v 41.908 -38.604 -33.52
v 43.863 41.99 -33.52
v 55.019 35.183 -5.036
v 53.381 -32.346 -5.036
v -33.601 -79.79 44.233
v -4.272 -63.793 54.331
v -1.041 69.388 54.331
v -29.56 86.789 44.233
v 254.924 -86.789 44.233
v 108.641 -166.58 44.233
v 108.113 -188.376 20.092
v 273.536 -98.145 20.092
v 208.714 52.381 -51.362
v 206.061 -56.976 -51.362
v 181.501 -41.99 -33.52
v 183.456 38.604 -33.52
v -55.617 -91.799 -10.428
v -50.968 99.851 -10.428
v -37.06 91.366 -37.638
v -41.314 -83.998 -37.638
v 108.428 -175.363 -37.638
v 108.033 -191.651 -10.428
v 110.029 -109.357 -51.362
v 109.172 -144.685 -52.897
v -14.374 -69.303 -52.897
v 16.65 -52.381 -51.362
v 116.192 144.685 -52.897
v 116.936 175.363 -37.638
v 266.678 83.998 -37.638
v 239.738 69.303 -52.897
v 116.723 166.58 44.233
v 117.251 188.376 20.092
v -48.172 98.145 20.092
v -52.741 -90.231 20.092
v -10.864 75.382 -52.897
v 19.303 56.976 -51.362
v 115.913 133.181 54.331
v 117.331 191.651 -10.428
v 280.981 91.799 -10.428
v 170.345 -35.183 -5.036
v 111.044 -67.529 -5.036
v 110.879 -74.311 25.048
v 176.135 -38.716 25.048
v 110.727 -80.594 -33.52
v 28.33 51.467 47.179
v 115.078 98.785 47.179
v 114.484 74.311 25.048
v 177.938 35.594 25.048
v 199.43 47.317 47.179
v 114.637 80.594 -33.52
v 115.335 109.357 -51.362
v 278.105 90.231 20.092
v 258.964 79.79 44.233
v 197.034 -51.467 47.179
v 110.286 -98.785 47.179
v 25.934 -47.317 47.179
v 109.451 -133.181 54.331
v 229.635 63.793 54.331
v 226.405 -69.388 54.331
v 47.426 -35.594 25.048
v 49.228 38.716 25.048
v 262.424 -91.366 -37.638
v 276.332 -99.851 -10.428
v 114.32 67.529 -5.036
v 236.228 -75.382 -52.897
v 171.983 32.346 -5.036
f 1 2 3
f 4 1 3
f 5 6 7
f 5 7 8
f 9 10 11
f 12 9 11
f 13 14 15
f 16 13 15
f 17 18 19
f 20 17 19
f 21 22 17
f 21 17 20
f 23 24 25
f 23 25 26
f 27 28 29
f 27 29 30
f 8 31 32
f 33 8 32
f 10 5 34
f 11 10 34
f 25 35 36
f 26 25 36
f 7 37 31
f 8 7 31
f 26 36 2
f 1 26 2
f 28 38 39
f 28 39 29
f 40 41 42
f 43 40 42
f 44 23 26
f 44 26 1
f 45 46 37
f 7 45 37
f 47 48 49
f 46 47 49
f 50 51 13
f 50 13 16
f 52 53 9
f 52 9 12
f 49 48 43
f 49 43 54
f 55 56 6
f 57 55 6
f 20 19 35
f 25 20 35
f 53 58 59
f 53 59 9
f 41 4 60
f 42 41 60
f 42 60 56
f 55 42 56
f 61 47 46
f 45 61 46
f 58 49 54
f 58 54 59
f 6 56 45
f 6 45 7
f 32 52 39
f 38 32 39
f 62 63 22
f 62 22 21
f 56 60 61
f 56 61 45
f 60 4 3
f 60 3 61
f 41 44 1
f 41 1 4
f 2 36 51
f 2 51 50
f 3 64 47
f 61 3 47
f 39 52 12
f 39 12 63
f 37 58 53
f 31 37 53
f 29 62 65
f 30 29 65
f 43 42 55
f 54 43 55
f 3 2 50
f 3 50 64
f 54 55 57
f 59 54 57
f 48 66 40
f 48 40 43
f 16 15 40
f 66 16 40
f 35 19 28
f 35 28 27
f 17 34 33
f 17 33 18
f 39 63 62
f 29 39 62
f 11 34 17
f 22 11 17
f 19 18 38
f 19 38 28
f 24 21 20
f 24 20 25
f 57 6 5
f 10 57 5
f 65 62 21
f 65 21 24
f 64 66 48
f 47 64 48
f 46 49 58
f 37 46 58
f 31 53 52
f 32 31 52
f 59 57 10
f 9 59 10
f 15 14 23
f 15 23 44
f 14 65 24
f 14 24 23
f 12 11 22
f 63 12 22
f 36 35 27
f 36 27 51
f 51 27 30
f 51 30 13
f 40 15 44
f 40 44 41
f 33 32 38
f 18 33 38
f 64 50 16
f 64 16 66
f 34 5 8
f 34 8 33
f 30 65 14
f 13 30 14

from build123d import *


with BuildPart() as f2:
    # F2: sweep along a path in F1
    with BuildLine(Plane.XY) as f2_path:
        Line((111.1026118188, -65.109723053), (55.505612987, -31.187103672))
        Line((55.505612987, -31.187103672), (57.0849637179, 33.922619381))
        Line((57.0849637179, 33.922619381), (114.2613132806, 65.109723053))
        Line((114.2613132806, 65.109723053), (169.8583121124, 31.187103672))
        Line((169.8583121124, 31.187103672), (168.2789613815, -33.922619381))
        Line((168.2789613815, -33.922619381), (111.1026118188, -65.109723053))
    # F0 (on Front) → F2 (sweep)
    with BuildSketch(Plane.XZ):
        Polygon((-12.6929697398, -52.8973966771), (17.9204861451, -51.3624593682), (42.8443142989, -33.5203041197), (54.1653753864, -5.0356891564), (48.2893125029, 25.0477215336), (27.0817340957, 47.1786576154), (-2.7241035365, 54.3307032528), (-31.6650575434, 44.2331344899), (-50.5525795149, 20.0918580627), (-53.3900146779, -10.428441337), (-39.2764974165, -37.6377842961), align=None)
    sweep(path=f2_path.line, transition=Transition.RIGHT)


solid = f2.part
